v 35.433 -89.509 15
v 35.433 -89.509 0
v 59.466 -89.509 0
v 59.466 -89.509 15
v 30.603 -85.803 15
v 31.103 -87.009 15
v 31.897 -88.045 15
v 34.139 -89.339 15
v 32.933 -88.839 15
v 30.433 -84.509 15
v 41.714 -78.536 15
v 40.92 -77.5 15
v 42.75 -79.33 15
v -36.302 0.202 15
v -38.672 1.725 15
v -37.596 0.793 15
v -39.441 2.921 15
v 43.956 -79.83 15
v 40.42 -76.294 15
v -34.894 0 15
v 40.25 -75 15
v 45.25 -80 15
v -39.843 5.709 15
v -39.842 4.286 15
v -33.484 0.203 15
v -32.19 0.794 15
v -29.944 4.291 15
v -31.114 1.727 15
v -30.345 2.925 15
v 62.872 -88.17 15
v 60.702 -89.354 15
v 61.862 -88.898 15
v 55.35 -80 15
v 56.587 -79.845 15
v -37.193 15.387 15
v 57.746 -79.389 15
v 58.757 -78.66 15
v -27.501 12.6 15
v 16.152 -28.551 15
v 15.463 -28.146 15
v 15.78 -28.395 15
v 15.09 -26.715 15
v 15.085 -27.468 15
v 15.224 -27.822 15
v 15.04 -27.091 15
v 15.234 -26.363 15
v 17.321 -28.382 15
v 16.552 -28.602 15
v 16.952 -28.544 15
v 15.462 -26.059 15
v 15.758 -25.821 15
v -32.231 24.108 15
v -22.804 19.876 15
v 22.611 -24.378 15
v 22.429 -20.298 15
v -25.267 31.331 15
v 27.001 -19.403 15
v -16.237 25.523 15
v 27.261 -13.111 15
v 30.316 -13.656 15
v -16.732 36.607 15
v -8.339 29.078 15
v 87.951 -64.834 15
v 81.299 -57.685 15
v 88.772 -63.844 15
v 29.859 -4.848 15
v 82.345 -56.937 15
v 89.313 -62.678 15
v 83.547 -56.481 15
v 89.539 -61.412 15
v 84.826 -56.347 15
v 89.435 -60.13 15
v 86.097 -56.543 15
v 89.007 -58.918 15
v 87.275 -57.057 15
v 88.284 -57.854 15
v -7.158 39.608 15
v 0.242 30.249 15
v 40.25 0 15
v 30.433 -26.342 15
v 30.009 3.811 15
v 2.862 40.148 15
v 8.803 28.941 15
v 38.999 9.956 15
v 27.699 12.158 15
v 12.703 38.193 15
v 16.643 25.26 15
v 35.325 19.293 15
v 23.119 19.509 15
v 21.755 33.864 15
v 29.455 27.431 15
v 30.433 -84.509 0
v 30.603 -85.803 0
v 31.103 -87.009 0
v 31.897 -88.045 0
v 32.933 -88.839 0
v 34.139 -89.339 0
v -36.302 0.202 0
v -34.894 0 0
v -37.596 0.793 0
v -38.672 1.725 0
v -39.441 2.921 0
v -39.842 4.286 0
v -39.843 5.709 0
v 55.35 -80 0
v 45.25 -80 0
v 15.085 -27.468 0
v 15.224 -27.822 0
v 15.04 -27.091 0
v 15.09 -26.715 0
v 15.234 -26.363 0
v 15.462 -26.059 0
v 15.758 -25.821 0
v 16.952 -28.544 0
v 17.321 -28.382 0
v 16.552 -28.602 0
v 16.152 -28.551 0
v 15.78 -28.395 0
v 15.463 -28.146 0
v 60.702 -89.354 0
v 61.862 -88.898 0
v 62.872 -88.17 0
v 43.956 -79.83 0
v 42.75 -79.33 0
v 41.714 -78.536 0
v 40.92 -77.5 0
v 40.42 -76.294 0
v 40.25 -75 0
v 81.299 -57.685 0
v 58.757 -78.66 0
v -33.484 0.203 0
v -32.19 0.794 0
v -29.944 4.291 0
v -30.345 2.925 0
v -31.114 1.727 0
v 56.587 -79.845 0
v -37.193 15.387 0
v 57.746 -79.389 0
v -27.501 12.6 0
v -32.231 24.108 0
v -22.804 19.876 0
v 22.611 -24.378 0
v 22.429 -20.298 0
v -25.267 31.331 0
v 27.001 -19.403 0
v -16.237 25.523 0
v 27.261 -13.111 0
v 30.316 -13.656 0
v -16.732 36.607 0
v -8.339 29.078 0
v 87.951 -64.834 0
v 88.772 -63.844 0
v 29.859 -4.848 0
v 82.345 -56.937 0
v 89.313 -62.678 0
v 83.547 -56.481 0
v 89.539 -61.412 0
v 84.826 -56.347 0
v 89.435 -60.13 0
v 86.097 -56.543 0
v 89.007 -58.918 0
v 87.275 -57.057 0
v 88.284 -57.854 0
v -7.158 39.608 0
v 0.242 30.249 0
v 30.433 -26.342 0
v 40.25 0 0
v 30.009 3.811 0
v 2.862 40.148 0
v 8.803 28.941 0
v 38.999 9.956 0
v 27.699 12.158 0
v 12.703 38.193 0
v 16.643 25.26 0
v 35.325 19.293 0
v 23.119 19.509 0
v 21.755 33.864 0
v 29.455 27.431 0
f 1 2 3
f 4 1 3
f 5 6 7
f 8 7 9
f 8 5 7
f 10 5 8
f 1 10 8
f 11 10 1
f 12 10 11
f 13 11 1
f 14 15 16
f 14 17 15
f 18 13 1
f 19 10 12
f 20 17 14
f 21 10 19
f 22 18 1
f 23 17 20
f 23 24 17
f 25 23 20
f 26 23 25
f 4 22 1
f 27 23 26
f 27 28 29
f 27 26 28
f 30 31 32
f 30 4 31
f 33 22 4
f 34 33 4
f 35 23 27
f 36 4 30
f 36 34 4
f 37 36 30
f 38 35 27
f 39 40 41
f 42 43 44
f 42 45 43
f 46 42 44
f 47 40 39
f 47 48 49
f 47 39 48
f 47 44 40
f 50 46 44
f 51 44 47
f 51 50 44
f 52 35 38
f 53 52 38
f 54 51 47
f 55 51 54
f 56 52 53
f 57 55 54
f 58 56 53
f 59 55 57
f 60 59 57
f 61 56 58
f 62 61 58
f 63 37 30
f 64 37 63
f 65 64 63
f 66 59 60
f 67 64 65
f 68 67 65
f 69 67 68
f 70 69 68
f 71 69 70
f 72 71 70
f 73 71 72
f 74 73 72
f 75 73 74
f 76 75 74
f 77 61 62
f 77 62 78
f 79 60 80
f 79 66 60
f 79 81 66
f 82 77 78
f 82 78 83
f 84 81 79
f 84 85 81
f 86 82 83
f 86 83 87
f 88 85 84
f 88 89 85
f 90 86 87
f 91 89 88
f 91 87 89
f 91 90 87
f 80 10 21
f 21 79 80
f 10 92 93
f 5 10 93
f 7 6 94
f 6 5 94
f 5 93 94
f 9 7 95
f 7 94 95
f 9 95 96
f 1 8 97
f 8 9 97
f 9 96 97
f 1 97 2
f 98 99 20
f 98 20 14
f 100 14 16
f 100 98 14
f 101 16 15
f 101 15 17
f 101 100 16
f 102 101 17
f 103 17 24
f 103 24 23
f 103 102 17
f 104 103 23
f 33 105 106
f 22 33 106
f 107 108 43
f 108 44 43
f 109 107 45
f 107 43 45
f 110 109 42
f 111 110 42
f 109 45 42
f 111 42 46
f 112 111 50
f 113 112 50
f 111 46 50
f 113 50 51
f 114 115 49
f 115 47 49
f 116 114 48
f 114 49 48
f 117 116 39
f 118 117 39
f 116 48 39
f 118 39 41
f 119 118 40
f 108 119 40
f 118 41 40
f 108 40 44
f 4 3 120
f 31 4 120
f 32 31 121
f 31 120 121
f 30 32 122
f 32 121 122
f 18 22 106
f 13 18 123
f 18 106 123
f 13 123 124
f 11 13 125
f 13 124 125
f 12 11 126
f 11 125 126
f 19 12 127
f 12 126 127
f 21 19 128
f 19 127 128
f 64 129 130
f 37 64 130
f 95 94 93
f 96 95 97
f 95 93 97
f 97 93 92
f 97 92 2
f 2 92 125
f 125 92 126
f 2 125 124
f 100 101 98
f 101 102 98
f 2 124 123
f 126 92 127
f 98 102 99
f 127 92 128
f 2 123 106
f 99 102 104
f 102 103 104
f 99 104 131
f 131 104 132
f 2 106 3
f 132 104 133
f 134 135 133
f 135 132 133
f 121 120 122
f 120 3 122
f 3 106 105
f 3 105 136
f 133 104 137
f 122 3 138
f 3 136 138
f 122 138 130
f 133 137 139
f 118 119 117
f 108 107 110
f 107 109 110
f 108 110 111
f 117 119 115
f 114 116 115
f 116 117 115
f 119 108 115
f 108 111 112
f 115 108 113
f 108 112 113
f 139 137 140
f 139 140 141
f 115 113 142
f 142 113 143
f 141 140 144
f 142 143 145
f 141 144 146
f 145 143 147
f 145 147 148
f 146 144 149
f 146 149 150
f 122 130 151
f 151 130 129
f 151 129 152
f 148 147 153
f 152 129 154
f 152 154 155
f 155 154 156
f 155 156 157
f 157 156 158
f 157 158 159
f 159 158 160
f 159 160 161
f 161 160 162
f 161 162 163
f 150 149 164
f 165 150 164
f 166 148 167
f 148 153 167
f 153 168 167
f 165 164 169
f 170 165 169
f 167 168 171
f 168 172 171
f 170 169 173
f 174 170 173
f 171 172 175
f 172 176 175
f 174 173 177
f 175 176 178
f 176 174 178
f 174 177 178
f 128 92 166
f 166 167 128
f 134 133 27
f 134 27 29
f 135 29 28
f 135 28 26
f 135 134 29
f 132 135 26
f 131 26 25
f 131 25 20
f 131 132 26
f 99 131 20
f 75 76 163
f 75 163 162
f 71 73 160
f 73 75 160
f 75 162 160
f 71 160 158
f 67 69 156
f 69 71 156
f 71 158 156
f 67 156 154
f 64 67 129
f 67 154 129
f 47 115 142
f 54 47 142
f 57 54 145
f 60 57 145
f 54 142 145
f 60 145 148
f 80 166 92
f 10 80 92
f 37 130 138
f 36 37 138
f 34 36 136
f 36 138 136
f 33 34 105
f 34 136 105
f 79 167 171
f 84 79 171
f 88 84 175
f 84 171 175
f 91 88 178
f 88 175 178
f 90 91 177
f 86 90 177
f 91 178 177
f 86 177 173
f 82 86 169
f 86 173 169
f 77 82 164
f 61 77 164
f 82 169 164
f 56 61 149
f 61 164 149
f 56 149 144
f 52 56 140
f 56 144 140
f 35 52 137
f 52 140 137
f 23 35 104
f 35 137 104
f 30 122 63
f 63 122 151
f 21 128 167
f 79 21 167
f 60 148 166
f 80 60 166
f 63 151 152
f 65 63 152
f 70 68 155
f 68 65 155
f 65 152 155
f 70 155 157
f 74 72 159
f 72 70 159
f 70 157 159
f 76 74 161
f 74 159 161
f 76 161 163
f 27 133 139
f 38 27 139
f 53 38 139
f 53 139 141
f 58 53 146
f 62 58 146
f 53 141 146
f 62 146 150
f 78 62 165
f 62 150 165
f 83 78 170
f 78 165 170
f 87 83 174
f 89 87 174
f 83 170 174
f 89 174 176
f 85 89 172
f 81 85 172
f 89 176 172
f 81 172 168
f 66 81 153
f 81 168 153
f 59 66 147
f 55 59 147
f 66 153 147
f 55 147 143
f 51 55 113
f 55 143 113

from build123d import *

# Parameters (mm, degrees)
F1_DEPTH    = 15
F2_T1_DEPTH = 15
F2_T3_DEPTH = 38.2179411812
F2_T5_DEPTH = 43.6185312436
F2_T7_DEPTH = 40
F2_T9_DEPTH = 24.832214185
F3_R        = 1.49999


# Not quite as in the source:
# - a fillet or chamfer that OpenCascade refuses, or shapes differently, is made with other operations: its cross-section is extruded or revolved along the edge and cut away or added
# - a fillet or chamfer is up to 0.001 mm smaller than in the source, because OpenCascade refuses the exact size


with BuildPart() as f1:
    # F0 (on Top) → F1 (new body)
    with BuildSketch(Plane.XY):
        with BuildLine():
            ThreePointArc((-30.25, 0), (15.4242466579, 26.0222042694), (14.5205861182, -26.5370510567))
            Line((14.5205861182, -26.5370510567), (15.9606442456, -29.1688247152))
            ThreePointArc((15.9606442456, -29.1688247152), (24.4038188383, -22.5835366164), (30.3161764706, -13.6562053369))
            Line((30.3161764706, -13.6562053369), (30.4329268293, -26.3419715398))
            Line((30.4329268293, -26.3419715398), (30.4329268293, -89.5091558098))
            Line((30.4329268293, -89.5091558098), (61.4327350343, -89.5091558098))
            Line((61.4327350343, -89.5091558098), (91.6112407267, -61.4279471198))
            Line((91.6112407267, -61.4279471198), (84.9590376288, -54.2789119314))
            Line((84.9590376288, -54.2789119314), (57.316922531, -80))
            Line((57.316922531, -80), (40.25, -80))
            Line((40.25, -80), (40.25, 0))
            ThreePointArc((40.25, 0), (0, 40.25), (-40.25, 0))
            Line((-40.25, 0), (-30.25, 0))
        make_face()
    extrude(amount=F1_DEPTH)

    # F2: fillet of radius 5 on 8 edges, made by hand

    # F2_s2 → F2_t1 (join)
    with BuildSketch(Plane.XY):
        with BuildLine():
            ThreePointArc((45.25, -80), (41.7144660941, -78.5355339059), (40.25, -75))
            Line((40.25, -75), (40.25, -80))
            Line((40.25, -80), (45.25, -80))
        make_face()
        with BuildLine():
            ThreePointArc((58.7565312825, -78.6604388503), (57.1804804794, -79.6530739437), (55.350479694, -80))
            Line((55.350479694, -80), (57.316922531, -80))
            Line((57.316922531, -80), (58.7565312825, -78.6604388503))
        make_face()
    extrude(amount=F2_T1_DEPTH)

    # F2_s4 → F2_t3 (cut)
    with BuildSketch(Plane.XY.offset(-11.6089705906)):
        with BuildLine():
            ThreePointArc((-29.9441430963, 4.2907801418), (-31.6183858983, 1.2220310158), (-34.8935882362, 0))
            Line((-34.8935882362, 0), (-30.25, 0))
            ThreePointArc((-30.25, 0), (-30.1734388881, 2.1508337146), (-29.9441430963, 4.2907801418))
        make_face()
    extrude(amount=F2_T3_DEPTH, mode=Mode.SUBTRACT)

    # F2_s6 → F2_t5 (cut)
    with BuildSketch(Plane.XY.offset(-14.3092656218)):
        with BuildLine():
            ThreePointArc((-34.8935882362, 0), (-38.6715572204, 1.724797662), (-39.8430333761, 5.7092198582))
            ThreePointArc((-39.8430333761, 5.7092198582), (-40.1481294296, 2.8618531244), (-40.25, 0))
            Line((-40.25, 0), (-34.8935882362, 0))
        make_face()
    extrude(amount=F2_T5_DEPTH, mode=Mode.SUBTRACT)

    # F2_s8 → F2_t7 (cut)
    with BuildSketch(Plane.XY.offset(-12.5)):
        with BuildLine():
            ThreePointArc((88.3650892173, -57.9393507817), (84.8845293249, -56.3486390617), (81.2985987785, -57.6849635199))
            Line((81.2985987785, -57.6849635199), (84.9590376288, -54.2789119314))
            Line((84.9590376288, -54.2789119314), (88.3650892173, -57.9393507817))
        make_face()
        with BuildLine():
            ThreePointArc((87.9508018764, -64.8339987083), (89.5415135964, -61.3534388159), (88.2051891382, -57.7675082695))
            Line((88.2051891382, -57.7675082695), (91.6112407267, -61.4279471198))
            Line((91.6112407267, -61.4279471198), (87.9508018764, -64.8339987083))
        make_face()
        with BuildLine():
            ThreePointArc((30.4329268293, -84.5091558098), (31.8973929233, -88.0446897157), (35.4329268293, -89.5091558098))
            Line((35.4329268293, -89.5091558098), (30.4329268293, -89.5091558098))
            Line((30.4329268293, -89.5091558098), (30.4329268293, -84.5091558098))
        make_face()
    extrude(amount=F2_T7_DEPTH, mode=Mode.SUBTRACT)

    # F2_s10 → F2_t9 (cut)
    with BuildSketch(Plane.XY.offset(-4.9161070925)):
        with BuildLine():
            ThreePointArc((59.4662921973, -89.5091558098), (61.2962929826, -89.1622297535), (62.8723437858, -88.1695946601))
            Line((62.8723437858, -88.1695946601), (61.4327350343, -89.5091558098))
            Line((61.4327350343, -89.5091558098), (59.4662921973, -89.5091558098))
        make_face()
    extrude(amount=F2_T9_DEPTH, mode=Mode.SUBTRACT)

    # F3 (radius 1.5 in the source; OpenCascade refuses exactly that, so slightly less here)
    f3_edges = [f1.edges().sort_by_distance(p)[0] for p in [
        (14.520586, -26.537051, 7.5),
        (15.960644, -29.168825, 7.5),
    ]]
    fillet(f3_edges, radius=F3_R)


solid = f1.part
